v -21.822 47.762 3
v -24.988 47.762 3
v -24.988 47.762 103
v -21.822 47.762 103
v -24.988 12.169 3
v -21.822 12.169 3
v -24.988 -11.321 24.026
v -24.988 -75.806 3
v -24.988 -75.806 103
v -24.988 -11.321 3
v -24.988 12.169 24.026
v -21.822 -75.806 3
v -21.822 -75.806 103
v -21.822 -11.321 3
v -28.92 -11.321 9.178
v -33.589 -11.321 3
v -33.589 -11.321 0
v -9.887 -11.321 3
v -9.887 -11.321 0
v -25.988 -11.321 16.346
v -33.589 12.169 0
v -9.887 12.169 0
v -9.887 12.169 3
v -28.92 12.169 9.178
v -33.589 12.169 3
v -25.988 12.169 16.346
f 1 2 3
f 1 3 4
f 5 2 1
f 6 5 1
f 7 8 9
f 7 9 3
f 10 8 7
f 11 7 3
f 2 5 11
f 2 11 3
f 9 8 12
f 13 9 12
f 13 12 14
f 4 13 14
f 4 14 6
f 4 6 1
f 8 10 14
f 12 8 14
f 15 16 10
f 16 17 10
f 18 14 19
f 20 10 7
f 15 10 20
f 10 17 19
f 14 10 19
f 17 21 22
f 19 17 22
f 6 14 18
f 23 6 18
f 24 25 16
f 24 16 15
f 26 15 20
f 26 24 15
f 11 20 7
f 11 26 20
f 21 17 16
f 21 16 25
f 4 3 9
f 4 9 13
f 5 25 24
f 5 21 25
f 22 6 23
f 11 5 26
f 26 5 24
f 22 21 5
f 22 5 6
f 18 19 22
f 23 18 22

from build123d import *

# Parameters (mm, degrees)
SKETCH_2_W      = 23.702391565
SKETCH_2_H      = 23.489524234
EXTRUDE_1_DEPTH = 3
SKETCH_3_W      = 3.165508912
SKETCH_3_H      = 123.567997976
EXTRUDE_2_DEPTH = 100
FILLET_1_R      = 30


with BuildPart() as part:
    # 草图2 → 凸台-拉伸1 (new body)
    with BuildSketch(Plane.XY):
        with Locations((-21.737891338, 0.42425972)):
            Rectangle(SKETCH_2_W, SKETCH_2_H)
    extrude(amount=EXTRUDE_1_DEPTH)

    # 草图3 → 凸台-拉伸2 (add)
    with BuildSketch(Plane.XY.offset(3)):
        with Locations((-23.40524573, -14.022020715)):
            Rectangle(SKETCH_3_W, SKETCH_3_H)
    extrude(amount=EXTRUDE_2_DEPTH)

    # 圆角1
    # the kernel refuses this fillet: 30 mm, written as the material it adds along each edge
    with BuildSketch(Plane(origin=(-24.988000186, 12.169021837, 3), x_dir=(-1, 0, 0), z_dir=(0, -1, 0))) as fillet_1_piece_1:
        with BuildLine():
            CenterArc((30, -21.025853601), FILLET_1_R, 135.503813775, 44.496186225)
            Line((0, -21.025853601), (0, 0))
            Line((0, 0), (8.601086935, 0))
        make_face()
    extrude(amount=23.489524234)


solid = part.part
